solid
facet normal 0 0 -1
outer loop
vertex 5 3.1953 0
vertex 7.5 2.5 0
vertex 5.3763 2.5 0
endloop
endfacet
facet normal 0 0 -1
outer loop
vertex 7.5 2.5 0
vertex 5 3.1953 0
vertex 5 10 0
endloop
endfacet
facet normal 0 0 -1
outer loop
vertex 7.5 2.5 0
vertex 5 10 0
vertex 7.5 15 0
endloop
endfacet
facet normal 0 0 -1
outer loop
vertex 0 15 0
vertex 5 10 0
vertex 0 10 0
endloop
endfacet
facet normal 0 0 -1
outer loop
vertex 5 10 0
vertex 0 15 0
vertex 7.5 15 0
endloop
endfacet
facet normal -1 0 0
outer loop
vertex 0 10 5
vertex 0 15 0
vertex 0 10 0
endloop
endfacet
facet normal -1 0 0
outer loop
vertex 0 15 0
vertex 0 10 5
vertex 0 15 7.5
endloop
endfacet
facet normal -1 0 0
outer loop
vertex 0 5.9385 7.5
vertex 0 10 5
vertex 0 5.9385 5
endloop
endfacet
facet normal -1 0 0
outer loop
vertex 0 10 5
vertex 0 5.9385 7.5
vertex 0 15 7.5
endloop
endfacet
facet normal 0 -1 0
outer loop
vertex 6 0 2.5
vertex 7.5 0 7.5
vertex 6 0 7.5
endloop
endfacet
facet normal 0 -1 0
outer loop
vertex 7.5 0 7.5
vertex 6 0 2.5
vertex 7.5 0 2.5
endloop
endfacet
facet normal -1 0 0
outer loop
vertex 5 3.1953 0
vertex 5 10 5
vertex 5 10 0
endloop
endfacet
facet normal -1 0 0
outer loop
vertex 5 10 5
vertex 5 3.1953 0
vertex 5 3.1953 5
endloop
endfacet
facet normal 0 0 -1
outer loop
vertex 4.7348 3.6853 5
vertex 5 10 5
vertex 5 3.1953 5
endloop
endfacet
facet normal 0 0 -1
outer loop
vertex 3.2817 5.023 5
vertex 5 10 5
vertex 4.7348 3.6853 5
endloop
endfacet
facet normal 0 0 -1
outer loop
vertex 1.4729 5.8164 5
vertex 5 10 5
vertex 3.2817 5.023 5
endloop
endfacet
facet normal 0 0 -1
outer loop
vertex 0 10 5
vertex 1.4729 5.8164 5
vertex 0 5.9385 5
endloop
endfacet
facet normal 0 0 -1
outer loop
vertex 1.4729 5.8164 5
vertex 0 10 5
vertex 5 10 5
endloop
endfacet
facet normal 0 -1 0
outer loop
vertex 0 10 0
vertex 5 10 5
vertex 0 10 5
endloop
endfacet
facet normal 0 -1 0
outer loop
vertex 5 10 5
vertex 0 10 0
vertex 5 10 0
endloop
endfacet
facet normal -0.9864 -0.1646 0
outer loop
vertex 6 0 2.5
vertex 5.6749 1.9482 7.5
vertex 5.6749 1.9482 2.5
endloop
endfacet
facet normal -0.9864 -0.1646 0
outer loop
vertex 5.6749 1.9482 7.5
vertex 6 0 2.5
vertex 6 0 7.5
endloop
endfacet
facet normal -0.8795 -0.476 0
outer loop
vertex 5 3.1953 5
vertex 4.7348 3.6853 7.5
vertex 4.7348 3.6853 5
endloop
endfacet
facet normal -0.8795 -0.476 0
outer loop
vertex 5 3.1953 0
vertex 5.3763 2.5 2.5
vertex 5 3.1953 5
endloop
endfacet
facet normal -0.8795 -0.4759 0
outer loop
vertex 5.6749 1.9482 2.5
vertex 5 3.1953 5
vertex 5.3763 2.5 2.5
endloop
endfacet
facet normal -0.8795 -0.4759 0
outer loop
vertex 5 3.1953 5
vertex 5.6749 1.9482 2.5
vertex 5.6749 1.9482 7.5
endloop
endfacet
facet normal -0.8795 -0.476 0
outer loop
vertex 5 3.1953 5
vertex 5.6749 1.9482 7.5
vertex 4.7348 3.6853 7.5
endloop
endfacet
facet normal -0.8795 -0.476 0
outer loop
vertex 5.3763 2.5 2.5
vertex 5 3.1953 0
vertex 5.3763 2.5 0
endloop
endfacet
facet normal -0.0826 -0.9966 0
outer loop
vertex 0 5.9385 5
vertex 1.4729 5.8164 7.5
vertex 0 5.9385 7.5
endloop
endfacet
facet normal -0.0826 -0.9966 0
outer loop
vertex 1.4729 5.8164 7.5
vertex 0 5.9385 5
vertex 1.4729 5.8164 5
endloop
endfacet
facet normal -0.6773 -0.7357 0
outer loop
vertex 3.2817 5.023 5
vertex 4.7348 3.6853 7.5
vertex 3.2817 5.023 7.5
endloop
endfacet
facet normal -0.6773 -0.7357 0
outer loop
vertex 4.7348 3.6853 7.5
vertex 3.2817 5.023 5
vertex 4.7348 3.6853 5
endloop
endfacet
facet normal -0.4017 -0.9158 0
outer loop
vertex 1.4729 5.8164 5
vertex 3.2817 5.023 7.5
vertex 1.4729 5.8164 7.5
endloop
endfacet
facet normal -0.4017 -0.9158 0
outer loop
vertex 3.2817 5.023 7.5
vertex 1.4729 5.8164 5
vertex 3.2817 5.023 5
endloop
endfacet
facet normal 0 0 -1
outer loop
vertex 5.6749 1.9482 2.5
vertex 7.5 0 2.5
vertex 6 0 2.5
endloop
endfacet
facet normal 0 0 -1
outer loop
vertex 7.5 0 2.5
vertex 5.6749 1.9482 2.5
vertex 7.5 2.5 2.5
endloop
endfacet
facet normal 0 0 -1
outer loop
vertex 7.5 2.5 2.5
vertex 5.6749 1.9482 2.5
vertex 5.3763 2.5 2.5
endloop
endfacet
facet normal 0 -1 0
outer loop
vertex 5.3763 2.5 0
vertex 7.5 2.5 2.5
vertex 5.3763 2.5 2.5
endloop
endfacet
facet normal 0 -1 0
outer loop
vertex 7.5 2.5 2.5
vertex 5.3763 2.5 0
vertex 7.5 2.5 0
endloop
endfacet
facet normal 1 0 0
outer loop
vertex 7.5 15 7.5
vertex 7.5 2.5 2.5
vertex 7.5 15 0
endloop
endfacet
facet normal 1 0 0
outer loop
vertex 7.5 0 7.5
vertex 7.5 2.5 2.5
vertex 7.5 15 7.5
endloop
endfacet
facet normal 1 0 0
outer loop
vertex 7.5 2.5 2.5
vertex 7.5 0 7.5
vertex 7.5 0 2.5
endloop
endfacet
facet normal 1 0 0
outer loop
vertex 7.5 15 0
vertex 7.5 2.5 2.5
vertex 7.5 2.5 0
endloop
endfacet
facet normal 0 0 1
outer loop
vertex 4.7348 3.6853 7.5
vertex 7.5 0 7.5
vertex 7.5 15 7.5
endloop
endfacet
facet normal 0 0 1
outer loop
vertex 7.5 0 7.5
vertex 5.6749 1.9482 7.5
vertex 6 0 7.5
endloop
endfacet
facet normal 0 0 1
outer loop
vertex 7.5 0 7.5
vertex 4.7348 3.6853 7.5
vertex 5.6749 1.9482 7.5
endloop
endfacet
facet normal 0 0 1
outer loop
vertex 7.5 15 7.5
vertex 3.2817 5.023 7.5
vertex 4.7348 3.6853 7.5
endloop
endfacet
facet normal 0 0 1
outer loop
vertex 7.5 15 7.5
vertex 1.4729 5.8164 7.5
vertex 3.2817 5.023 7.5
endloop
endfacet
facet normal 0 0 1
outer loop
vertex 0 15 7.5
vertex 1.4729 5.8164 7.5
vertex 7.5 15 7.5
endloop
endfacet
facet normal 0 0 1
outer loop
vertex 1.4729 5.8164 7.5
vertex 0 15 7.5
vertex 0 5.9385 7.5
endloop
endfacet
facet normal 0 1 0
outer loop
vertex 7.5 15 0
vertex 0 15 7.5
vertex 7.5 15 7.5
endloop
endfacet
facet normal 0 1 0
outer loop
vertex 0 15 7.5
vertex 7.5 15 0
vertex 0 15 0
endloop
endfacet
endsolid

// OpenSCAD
// Generated by generate_scads.py
intersection() {
  cube(size=[15,30,15], center=true);
  difference() {
    cube(size=[20,25,15], center=false);
    cube(size=[5,10,5], center=false);
    cylinder(h=20, r=6, center=true);
    cube(size=[30,5,5], center=true);
  }
}
